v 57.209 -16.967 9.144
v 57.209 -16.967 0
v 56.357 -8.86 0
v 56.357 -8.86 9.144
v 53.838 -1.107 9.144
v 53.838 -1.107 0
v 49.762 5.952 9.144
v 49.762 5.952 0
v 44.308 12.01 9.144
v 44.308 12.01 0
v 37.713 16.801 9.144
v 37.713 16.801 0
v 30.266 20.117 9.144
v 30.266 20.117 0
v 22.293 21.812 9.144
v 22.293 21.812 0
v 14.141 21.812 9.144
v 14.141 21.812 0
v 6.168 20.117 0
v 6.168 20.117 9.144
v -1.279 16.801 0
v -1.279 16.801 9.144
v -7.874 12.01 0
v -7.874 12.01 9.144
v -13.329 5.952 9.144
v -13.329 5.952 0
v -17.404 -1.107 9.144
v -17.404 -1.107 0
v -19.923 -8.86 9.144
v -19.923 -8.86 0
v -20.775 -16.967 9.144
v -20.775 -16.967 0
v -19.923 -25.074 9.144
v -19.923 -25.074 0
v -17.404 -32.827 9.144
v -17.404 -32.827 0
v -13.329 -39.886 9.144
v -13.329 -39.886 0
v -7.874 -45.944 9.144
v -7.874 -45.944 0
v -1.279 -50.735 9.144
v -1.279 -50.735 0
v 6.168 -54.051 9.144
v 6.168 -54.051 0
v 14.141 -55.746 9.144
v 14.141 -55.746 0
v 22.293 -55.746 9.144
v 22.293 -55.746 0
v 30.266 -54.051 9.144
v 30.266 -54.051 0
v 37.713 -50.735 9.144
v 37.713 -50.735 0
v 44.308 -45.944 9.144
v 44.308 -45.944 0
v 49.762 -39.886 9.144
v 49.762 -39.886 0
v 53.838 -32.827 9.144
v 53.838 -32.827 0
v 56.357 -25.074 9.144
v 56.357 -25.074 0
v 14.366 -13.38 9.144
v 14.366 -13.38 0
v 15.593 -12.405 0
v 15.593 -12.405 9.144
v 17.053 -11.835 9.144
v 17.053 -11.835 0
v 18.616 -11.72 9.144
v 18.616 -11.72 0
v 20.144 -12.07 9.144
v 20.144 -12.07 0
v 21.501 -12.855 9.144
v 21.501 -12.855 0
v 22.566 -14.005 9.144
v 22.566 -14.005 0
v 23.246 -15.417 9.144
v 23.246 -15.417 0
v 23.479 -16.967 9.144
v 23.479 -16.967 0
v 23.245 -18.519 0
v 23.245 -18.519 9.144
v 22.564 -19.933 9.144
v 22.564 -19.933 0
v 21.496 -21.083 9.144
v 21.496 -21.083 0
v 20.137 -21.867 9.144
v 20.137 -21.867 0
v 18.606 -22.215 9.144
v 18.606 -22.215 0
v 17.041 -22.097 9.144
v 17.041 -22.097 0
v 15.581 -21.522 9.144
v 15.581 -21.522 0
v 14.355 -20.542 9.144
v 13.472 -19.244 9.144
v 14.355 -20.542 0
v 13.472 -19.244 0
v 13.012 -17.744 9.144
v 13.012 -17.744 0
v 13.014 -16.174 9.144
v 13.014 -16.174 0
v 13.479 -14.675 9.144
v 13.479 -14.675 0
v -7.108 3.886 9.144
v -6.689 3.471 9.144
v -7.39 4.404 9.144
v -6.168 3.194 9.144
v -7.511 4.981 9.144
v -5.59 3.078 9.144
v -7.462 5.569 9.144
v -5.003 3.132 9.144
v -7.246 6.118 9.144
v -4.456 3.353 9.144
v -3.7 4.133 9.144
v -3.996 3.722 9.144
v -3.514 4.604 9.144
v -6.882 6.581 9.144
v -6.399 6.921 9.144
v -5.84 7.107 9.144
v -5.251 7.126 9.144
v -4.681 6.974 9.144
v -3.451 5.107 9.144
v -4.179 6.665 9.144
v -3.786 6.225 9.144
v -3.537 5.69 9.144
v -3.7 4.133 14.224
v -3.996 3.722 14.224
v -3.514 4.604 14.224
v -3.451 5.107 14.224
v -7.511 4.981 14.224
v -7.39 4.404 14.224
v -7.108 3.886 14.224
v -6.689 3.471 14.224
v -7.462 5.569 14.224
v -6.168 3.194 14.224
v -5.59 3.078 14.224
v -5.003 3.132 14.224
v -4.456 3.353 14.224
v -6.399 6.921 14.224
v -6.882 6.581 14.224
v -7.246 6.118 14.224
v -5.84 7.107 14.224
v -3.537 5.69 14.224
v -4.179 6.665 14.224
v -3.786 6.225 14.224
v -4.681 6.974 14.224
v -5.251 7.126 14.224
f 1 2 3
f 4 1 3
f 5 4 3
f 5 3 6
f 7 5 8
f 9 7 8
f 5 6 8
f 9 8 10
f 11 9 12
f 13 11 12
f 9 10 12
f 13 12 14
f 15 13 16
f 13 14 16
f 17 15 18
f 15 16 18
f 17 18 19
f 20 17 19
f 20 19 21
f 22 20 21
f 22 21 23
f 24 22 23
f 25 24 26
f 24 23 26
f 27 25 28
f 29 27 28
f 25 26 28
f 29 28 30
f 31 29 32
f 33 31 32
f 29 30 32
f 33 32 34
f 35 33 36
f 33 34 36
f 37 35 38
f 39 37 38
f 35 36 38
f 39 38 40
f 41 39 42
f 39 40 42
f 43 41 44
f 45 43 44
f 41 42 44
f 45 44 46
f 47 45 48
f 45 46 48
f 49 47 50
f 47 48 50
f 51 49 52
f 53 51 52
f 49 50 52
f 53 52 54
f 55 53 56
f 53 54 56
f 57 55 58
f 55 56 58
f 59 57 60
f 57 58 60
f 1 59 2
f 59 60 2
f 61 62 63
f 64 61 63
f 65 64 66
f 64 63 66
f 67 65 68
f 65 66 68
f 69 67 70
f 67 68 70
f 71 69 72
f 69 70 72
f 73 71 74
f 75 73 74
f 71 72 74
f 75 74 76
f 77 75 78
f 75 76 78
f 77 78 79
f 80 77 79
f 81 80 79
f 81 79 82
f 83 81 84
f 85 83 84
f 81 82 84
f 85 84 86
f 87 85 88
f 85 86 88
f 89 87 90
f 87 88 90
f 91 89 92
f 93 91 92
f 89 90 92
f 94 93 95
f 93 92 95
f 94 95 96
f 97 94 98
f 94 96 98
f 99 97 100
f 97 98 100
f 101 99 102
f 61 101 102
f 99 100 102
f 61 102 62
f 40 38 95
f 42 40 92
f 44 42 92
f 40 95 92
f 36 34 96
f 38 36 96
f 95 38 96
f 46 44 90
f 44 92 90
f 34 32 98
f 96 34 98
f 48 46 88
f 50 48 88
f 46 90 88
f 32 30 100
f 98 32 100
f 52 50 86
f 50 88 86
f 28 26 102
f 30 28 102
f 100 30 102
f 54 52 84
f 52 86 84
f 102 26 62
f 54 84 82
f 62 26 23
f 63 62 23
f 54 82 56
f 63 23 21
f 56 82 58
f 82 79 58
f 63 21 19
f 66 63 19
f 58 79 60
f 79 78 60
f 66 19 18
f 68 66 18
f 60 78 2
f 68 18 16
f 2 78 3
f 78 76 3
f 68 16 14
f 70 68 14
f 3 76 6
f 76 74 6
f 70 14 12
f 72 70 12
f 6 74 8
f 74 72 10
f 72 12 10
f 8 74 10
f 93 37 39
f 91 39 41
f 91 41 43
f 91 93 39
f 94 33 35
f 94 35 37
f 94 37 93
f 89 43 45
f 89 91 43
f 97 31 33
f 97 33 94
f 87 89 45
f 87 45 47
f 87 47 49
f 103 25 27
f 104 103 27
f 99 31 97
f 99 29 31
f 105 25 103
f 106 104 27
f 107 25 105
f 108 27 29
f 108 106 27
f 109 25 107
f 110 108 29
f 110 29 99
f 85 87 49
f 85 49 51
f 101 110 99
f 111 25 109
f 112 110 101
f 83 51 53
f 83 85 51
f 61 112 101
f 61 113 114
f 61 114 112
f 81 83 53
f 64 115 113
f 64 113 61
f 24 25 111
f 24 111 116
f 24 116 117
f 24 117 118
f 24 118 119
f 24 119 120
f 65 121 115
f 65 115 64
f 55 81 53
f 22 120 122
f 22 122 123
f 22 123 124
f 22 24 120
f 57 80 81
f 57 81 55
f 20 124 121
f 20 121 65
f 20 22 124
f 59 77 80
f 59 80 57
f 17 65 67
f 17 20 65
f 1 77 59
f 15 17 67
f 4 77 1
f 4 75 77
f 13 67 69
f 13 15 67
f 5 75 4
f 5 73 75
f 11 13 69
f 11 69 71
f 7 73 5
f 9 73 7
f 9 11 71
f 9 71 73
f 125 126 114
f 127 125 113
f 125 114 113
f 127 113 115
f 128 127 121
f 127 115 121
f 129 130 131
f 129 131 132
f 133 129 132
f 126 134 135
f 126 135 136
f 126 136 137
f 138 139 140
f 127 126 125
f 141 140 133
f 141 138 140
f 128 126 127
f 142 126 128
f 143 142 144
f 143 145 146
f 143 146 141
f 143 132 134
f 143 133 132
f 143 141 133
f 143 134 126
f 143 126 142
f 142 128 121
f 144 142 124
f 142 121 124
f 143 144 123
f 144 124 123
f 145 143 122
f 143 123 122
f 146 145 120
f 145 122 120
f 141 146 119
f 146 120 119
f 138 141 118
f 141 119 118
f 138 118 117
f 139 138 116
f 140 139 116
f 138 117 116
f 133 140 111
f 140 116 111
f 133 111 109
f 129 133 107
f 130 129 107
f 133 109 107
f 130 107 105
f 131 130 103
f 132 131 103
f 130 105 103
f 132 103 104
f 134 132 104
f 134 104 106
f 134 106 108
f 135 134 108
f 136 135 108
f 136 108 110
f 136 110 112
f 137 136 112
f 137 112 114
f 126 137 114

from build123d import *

# Parameters (mm, degrees)
F0_R     = 38.99223
F1_DEPTH = 9.144
F2_DEPTH = 14.224


with BuildPart() as f1:
    # F0 (on Top) → F1 (new body)
    with BuildSketch(Plane.XY):
        with Locations((18.216823, -16.966983)):
            Circle(F0_R)
        with BuildLine():
            ThreePointArc((-3.451107, 5.106916), (-3.592274, 4.362754), (-3.996163, 3.721989))
            ThreePointArc((-3.996163, 3.721989), (-7.373939, 5.851077), (-3.451107, 5.106916))
        make_face(mode=Mode.SUBTRACT)
        with BuildLine():
            ThreePointArc((14.365916, -13.380283), (20.144063, -12.07008), (23.479323, -16.966983))
            ThreePointArc((23.479323, -16.966983), (16.289584, -21.863885), (14.365916, -13.380283))
        make_face(mode=Mode.SUBTRACT)
        with BuildLine():
            ThreePointArc((-3.451107, 5.106916), (-7.373939, 5.851077), (-3.996163, 3.721989))
            ThreePointArc((-3.996163, 3.721989), (-3.592274, 4.362754), (-3.451107, 5.106916))
        make_face()
    extrude(amount=F1_DEPTH)

    # F0 (on Top) → F2 (join)
    with BuildSketch(Plane.XY):
        with BuildLine():
            ThreePointArc((-3.451107, 5.106916), (-7.373939, 5.851077), (-3.996163, 3.721989))
            ThreePointArc((-3.996163, 3.721989), (-3.592274, 4.362754), (-3.451107, 5.106916))
        make_face()
    extrude(amount=F2_DEPTH)


solid = f1.part
